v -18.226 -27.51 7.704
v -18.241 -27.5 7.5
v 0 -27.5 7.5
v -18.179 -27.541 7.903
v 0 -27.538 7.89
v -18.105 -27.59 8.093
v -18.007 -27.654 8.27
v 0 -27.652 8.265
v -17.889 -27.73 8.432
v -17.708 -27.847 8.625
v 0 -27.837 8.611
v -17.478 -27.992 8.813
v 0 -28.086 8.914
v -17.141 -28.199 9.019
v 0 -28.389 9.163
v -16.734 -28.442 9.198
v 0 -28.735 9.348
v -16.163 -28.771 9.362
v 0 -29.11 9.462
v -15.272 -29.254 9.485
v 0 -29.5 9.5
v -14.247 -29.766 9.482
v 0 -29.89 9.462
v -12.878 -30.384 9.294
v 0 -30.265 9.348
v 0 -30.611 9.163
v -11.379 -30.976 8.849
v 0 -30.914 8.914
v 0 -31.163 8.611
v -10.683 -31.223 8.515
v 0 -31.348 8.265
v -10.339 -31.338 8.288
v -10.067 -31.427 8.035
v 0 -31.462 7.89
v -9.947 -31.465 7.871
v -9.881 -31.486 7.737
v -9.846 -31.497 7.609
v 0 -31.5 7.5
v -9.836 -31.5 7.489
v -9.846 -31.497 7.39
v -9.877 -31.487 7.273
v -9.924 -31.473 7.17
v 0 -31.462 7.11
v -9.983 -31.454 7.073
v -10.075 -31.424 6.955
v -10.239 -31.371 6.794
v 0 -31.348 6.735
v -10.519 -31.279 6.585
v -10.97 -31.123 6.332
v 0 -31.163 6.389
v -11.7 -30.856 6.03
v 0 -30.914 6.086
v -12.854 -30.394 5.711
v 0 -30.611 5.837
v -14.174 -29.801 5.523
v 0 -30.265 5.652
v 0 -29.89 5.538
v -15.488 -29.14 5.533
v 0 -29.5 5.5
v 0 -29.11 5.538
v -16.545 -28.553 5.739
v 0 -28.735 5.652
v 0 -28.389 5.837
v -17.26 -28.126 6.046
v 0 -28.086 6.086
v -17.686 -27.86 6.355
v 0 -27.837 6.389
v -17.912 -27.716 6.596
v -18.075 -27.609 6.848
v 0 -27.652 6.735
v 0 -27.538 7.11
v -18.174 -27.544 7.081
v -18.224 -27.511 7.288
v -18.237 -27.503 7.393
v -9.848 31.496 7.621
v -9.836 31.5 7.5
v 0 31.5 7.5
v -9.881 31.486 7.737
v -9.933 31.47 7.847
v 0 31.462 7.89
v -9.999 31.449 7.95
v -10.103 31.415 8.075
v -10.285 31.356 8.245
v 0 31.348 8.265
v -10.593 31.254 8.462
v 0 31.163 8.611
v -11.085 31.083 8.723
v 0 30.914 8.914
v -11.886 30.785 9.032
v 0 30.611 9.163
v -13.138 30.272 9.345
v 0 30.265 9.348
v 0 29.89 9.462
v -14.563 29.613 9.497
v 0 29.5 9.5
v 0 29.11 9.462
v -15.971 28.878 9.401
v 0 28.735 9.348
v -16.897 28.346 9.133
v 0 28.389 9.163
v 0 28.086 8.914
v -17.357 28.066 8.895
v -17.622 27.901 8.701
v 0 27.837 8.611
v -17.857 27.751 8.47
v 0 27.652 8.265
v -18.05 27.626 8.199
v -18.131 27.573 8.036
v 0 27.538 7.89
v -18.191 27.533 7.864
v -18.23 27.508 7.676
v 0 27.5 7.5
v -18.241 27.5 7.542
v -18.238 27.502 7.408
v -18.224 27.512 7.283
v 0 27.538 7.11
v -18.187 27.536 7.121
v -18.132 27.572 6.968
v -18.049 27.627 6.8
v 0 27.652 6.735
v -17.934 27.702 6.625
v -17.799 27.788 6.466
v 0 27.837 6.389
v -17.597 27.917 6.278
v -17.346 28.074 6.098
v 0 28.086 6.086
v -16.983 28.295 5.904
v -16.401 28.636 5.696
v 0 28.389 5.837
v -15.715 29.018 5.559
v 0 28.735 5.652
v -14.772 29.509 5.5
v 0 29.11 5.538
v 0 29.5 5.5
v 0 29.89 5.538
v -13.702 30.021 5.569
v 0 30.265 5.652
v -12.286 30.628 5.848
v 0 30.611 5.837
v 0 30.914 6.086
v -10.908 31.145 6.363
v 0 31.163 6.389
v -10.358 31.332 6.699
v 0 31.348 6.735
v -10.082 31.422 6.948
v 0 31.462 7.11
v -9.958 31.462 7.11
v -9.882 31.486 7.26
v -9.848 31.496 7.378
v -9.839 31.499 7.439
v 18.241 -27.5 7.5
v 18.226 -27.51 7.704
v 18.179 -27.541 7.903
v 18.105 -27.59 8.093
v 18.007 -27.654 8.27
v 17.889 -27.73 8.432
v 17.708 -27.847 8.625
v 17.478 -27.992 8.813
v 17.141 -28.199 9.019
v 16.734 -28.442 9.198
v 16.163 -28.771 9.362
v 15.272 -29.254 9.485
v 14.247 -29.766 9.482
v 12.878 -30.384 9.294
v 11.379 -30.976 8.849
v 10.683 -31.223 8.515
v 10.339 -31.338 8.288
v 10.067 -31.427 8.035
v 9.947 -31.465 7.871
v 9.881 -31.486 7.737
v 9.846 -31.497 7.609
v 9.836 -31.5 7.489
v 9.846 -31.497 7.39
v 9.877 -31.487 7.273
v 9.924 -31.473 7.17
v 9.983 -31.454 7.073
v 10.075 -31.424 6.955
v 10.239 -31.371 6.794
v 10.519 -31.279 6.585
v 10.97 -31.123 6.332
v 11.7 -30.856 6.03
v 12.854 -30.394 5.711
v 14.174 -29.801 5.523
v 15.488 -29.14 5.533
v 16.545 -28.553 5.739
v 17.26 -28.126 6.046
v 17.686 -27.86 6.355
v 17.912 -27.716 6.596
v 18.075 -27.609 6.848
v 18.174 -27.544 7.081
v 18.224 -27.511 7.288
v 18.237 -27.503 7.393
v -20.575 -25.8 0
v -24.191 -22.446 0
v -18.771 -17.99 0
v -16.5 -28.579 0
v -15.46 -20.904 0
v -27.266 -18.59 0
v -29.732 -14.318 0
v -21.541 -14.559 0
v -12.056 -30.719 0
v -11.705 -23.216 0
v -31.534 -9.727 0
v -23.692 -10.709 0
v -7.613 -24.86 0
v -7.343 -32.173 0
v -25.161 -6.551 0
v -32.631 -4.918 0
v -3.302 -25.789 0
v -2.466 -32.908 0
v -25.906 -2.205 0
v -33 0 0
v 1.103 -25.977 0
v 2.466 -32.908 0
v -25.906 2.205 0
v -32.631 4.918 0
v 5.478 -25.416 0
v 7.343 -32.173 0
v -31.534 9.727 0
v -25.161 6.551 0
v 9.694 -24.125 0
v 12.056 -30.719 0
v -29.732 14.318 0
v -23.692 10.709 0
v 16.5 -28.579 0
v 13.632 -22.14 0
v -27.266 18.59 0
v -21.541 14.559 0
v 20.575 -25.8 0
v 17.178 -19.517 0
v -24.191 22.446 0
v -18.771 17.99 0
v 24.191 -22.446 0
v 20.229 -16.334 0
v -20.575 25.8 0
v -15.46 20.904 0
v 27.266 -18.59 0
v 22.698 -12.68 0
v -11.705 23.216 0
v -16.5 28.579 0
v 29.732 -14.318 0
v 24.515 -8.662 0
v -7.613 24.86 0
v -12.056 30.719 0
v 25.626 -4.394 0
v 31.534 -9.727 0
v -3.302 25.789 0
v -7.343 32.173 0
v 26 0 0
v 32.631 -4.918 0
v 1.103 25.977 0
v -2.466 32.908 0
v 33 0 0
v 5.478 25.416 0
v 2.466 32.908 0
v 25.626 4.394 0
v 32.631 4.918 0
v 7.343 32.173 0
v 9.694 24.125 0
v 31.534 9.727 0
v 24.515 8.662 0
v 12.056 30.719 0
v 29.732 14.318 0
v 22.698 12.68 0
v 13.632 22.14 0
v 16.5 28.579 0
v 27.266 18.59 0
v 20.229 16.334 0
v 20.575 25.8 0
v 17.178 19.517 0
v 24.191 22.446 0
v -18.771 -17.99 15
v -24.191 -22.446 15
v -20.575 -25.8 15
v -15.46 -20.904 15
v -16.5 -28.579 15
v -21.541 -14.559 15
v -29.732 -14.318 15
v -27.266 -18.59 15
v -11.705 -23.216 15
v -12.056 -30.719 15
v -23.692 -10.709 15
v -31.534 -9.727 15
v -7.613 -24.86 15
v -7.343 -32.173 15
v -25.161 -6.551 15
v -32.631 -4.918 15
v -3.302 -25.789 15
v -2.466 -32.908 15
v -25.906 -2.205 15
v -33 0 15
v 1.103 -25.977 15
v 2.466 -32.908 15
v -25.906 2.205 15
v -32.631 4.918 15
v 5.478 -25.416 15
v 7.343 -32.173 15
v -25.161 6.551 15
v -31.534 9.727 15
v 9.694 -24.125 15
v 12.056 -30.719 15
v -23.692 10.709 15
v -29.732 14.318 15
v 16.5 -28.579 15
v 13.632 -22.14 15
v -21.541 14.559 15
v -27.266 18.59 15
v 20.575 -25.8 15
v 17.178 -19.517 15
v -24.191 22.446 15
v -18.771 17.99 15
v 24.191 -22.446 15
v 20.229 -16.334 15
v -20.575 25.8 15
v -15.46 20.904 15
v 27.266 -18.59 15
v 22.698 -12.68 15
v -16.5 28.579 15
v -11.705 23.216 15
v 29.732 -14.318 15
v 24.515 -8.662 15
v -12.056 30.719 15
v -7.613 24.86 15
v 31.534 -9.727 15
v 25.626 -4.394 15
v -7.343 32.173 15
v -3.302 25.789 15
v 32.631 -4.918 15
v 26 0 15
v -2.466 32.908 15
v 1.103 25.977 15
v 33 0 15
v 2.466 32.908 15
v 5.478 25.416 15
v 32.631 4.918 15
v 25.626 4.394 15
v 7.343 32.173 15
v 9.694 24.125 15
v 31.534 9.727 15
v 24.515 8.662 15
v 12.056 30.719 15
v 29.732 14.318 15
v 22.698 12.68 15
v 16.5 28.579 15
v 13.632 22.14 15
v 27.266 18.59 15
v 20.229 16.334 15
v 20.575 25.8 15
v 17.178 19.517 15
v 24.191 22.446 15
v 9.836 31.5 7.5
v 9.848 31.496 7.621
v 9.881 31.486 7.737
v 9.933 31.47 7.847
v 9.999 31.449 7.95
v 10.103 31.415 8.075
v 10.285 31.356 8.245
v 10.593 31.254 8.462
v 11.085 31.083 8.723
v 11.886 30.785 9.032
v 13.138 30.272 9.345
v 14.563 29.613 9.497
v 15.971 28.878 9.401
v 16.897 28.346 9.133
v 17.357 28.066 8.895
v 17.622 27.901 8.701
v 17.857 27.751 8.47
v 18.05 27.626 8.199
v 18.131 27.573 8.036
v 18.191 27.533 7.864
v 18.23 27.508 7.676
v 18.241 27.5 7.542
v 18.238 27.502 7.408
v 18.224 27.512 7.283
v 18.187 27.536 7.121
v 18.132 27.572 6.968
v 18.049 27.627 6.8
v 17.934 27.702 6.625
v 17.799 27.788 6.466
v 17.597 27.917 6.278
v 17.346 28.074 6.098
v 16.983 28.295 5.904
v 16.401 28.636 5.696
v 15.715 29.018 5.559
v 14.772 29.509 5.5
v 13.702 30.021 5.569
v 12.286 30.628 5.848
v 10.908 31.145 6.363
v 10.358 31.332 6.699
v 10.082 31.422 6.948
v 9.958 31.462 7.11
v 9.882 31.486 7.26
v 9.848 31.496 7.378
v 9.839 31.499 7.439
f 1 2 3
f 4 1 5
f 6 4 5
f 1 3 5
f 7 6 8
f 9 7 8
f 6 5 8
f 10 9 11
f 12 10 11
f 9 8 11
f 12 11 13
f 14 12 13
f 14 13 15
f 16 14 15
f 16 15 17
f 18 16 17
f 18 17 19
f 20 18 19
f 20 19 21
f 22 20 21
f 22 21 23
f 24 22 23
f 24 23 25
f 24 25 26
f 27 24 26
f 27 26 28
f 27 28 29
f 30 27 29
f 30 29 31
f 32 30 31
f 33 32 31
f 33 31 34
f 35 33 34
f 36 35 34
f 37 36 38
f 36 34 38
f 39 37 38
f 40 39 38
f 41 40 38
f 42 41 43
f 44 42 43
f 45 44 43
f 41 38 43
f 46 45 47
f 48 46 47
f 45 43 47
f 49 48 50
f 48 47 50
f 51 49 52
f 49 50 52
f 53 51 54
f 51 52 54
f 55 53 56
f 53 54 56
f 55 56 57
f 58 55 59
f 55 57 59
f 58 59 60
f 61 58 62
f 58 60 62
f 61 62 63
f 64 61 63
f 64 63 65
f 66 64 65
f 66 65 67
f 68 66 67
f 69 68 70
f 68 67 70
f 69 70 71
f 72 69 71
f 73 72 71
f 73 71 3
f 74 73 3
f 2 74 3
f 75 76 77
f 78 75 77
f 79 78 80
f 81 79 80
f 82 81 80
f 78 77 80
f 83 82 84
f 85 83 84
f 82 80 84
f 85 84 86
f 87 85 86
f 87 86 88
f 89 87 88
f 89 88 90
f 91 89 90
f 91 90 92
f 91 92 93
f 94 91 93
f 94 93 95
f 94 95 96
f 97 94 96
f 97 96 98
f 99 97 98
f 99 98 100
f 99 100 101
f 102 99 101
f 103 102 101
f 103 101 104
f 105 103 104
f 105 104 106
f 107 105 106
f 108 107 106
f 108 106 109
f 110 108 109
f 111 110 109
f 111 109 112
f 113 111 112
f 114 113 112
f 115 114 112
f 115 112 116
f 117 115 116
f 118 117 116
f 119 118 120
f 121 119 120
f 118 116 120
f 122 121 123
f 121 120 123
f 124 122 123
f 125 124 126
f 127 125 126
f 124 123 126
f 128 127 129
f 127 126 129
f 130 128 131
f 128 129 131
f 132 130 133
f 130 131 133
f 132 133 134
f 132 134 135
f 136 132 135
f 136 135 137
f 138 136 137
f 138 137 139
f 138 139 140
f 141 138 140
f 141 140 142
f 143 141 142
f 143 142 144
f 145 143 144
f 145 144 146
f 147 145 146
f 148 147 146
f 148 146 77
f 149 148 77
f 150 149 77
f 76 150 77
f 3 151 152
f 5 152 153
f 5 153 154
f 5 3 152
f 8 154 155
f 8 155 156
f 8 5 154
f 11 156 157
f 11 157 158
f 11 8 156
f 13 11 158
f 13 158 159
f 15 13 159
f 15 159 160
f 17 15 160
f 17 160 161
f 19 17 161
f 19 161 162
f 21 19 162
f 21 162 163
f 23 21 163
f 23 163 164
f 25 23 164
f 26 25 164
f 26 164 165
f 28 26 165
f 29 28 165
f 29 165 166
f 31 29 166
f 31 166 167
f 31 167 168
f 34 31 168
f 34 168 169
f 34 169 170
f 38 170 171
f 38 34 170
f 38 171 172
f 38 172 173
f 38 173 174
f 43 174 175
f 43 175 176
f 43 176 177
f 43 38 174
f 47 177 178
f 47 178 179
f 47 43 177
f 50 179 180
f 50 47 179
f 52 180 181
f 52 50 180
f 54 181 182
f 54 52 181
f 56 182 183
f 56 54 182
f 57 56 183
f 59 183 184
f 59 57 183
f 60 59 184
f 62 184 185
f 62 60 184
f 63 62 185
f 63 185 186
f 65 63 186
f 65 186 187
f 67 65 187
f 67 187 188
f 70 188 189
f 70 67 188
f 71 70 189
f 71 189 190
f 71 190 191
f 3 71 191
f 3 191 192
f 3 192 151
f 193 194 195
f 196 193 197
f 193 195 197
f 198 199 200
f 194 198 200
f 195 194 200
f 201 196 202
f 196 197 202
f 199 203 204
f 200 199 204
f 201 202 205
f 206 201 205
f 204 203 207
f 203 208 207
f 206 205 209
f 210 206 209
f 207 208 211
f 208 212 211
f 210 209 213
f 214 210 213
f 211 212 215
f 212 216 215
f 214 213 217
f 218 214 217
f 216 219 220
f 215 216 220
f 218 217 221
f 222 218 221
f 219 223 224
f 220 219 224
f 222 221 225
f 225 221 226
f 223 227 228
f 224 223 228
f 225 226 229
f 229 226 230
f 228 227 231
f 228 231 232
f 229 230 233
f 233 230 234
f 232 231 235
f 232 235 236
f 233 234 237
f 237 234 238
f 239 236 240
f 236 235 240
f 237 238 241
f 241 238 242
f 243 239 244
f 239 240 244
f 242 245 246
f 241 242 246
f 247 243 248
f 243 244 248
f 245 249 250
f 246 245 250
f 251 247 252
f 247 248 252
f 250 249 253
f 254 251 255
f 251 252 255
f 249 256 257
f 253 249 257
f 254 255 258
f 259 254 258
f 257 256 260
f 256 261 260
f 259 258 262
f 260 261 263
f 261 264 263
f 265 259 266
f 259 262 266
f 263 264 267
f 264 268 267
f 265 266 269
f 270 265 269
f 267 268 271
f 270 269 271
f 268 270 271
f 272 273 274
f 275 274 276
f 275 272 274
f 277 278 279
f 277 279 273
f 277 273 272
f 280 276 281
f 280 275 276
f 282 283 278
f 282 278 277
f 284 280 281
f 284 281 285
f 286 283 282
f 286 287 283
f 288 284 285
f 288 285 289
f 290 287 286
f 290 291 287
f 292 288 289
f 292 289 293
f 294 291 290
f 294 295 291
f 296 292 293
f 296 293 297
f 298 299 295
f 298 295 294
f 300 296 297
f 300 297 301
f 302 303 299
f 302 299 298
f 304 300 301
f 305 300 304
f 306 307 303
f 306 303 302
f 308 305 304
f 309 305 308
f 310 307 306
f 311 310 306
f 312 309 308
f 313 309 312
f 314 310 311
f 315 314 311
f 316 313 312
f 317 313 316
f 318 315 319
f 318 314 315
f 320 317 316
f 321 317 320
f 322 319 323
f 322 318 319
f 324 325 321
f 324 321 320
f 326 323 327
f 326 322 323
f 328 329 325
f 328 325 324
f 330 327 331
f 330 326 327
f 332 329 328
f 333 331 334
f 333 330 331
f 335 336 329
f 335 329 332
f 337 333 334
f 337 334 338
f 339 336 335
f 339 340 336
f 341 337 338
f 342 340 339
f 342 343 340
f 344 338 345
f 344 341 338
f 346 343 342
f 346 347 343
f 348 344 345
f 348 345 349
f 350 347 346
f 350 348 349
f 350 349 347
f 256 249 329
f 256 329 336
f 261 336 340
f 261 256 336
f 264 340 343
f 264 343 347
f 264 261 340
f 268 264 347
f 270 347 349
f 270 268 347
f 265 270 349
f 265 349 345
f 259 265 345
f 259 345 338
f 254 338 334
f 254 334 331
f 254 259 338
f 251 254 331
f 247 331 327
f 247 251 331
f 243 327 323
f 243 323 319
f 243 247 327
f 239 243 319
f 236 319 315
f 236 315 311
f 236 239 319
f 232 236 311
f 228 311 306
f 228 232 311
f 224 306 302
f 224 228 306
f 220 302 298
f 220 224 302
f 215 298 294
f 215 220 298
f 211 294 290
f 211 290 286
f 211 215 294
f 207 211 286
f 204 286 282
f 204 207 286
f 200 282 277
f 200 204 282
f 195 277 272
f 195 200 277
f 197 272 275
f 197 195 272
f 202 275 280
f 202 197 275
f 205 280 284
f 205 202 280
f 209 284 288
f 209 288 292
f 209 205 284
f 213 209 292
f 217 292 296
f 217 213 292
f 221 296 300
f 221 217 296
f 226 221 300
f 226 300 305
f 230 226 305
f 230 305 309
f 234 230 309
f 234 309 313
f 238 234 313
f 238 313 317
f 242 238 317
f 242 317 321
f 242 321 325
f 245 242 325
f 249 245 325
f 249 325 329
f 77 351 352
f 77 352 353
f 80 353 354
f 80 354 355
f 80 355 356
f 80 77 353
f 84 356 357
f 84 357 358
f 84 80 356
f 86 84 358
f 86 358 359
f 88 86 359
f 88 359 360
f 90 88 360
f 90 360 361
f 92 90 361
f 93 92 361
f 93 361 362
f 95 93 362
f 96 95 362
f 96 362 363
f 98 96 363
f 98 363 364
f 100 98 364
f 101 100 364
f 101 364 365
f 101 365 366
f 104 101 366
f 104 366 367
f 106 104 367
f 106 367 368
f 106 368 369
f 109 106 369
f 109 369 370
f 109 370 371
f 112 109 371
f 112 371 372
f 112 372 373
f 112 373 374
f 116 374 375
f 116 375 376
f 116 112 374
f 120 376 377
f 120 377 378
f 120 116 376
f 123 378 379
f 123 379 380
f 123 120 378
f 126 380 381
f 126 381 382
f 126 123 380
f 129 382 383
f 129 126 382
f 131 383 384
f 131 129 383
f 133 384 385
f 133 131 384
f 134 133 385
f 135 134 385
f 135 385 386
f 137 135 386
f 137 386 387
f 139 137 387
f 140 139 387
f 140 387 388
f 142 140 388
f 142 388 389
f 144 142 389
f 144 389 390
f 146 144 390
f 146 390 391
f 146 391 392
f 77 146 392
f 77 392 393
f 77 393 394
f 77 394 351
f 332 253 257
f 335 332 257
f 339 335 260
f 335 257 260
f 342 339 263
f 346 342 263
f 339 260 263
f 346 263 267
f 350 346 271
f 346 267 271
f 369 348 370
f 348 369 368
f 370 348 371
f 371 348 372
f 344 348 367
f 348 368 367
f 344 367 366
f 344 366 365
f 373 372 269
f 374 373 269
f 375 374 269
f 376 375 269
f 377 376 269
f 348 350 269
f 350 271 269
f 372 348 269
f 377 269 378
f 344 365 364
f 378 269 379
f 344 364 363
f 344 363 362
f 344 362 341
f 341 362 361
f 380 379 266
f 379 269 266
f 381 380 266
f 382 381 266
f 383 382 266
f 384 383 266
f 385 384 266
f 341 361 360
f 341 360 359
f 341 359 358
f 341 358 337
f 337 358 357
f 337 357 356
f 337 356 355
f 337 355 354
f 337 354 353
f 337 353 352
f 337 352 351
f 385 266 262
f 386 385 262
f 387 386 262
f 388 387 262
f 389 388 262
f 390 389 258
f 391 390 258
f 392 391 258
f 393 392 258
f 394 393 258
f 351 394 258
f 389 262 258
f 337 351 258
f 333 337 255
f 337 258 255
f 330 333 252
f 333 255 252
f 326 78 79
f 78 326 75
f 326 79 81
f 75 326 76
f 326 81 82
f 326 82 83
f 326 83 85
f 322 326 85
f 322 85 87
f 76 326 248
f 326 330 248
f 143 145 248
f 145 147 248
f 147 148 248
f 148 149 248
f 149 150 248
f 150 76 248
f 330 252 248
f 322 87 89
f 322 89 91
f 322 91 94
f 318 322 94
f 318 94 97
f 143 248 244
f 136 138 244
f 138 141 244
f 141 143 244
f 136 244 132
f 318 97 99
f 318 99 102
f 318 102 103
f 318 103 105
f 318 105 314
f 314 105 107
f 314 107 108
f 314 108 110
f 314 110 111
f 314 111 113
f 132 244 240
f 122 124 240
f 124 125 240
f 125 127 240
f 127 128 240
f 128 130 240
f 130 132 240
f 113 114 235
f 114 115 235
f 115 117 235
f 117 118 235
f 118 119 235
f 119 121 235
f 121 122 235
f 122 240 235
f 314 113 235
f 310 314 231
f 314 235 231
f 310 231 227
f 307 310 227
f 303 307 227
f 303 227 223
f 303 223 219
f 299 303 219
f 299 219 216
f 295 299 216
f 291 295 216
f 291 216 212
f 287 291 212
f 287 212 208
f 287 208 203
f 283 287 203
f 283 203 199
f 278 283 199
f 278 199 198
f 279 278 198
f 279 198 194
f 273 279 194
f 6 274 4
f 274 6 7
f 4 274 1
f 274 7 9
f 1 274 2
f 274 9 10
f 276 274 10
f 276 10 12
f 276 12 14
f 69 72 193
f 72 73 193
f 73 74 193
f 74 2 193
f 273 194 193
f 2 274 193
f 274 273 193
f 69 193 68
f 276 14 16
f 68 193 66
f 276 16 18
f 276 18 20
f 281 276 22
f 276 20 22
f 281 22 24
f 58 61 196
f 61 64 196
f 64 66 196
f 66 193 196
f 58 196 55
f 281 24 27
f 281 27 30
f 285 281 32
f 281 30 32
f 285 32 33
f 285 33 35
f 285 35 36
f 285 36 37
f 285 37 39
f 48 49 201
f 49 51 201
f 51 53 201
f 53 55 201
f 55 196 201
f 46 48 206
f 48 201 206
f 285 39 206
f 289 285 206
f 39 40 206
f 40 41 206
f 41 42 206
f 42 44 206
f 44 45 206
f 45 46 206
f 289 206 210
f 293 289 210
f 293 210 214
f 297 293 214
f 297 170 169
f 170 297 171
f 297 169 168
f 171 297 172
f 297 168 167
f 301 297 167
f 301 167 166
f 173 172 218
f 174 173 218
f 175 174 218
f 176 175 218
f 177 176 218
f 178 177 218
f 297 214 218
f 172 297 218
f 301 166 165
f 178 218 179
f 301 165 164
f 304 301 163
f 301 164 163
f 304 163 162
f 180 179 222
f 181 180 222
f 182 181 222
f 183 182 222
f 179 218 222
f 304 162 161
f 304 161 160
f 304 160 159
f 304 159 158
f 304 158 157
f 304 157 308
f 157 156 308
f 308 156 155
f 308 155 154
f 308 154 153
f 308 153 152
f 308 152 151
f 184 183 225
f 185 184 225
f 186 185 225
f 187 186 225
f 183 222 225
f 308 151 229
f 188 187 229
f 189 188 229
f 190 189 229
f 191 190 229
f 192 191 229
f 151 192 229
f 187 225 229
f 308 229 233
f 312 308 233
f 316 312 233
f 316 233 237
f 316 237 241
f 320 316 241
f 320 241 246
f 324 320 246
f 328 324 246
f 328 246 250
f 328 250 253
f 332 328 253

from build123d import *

# Parameters (mm, degrees)
F0_R          = 33
F0_R_2        = 26
F1_DEPTH      = 15
F2_R          = 2
F3_DEPTH      = 33.001
F3_DEPTH_BACK = 33.001


with BuildPart() as f1:
    # F0 (on Top) → F1 (new body)
    with BuildSketch(Plane.XY):
        Circle(F0_R)
        Circle(F0_R_2, mode=Mode.SUBTRACT)
    extrude(amount=F1_DEPTH)

    # F2 (on Right) → F3 (cut, two sides)
    with BuildSketch(Plane.YZ) as f3_sk:
        with Locations((29.5, 7.5)):
            Circle(F2_R)
        with Locations((-29.5, 7.5)):
            Circle(F2_R)
    extrude(amount=-F3_DEPTH, mode=Mode.SUBTRACT)
    extrude(f3_sk.sketch, amount=F3_DEPTH_BACK, mode=Mode.SUBTRACT)


solid = f1.part
